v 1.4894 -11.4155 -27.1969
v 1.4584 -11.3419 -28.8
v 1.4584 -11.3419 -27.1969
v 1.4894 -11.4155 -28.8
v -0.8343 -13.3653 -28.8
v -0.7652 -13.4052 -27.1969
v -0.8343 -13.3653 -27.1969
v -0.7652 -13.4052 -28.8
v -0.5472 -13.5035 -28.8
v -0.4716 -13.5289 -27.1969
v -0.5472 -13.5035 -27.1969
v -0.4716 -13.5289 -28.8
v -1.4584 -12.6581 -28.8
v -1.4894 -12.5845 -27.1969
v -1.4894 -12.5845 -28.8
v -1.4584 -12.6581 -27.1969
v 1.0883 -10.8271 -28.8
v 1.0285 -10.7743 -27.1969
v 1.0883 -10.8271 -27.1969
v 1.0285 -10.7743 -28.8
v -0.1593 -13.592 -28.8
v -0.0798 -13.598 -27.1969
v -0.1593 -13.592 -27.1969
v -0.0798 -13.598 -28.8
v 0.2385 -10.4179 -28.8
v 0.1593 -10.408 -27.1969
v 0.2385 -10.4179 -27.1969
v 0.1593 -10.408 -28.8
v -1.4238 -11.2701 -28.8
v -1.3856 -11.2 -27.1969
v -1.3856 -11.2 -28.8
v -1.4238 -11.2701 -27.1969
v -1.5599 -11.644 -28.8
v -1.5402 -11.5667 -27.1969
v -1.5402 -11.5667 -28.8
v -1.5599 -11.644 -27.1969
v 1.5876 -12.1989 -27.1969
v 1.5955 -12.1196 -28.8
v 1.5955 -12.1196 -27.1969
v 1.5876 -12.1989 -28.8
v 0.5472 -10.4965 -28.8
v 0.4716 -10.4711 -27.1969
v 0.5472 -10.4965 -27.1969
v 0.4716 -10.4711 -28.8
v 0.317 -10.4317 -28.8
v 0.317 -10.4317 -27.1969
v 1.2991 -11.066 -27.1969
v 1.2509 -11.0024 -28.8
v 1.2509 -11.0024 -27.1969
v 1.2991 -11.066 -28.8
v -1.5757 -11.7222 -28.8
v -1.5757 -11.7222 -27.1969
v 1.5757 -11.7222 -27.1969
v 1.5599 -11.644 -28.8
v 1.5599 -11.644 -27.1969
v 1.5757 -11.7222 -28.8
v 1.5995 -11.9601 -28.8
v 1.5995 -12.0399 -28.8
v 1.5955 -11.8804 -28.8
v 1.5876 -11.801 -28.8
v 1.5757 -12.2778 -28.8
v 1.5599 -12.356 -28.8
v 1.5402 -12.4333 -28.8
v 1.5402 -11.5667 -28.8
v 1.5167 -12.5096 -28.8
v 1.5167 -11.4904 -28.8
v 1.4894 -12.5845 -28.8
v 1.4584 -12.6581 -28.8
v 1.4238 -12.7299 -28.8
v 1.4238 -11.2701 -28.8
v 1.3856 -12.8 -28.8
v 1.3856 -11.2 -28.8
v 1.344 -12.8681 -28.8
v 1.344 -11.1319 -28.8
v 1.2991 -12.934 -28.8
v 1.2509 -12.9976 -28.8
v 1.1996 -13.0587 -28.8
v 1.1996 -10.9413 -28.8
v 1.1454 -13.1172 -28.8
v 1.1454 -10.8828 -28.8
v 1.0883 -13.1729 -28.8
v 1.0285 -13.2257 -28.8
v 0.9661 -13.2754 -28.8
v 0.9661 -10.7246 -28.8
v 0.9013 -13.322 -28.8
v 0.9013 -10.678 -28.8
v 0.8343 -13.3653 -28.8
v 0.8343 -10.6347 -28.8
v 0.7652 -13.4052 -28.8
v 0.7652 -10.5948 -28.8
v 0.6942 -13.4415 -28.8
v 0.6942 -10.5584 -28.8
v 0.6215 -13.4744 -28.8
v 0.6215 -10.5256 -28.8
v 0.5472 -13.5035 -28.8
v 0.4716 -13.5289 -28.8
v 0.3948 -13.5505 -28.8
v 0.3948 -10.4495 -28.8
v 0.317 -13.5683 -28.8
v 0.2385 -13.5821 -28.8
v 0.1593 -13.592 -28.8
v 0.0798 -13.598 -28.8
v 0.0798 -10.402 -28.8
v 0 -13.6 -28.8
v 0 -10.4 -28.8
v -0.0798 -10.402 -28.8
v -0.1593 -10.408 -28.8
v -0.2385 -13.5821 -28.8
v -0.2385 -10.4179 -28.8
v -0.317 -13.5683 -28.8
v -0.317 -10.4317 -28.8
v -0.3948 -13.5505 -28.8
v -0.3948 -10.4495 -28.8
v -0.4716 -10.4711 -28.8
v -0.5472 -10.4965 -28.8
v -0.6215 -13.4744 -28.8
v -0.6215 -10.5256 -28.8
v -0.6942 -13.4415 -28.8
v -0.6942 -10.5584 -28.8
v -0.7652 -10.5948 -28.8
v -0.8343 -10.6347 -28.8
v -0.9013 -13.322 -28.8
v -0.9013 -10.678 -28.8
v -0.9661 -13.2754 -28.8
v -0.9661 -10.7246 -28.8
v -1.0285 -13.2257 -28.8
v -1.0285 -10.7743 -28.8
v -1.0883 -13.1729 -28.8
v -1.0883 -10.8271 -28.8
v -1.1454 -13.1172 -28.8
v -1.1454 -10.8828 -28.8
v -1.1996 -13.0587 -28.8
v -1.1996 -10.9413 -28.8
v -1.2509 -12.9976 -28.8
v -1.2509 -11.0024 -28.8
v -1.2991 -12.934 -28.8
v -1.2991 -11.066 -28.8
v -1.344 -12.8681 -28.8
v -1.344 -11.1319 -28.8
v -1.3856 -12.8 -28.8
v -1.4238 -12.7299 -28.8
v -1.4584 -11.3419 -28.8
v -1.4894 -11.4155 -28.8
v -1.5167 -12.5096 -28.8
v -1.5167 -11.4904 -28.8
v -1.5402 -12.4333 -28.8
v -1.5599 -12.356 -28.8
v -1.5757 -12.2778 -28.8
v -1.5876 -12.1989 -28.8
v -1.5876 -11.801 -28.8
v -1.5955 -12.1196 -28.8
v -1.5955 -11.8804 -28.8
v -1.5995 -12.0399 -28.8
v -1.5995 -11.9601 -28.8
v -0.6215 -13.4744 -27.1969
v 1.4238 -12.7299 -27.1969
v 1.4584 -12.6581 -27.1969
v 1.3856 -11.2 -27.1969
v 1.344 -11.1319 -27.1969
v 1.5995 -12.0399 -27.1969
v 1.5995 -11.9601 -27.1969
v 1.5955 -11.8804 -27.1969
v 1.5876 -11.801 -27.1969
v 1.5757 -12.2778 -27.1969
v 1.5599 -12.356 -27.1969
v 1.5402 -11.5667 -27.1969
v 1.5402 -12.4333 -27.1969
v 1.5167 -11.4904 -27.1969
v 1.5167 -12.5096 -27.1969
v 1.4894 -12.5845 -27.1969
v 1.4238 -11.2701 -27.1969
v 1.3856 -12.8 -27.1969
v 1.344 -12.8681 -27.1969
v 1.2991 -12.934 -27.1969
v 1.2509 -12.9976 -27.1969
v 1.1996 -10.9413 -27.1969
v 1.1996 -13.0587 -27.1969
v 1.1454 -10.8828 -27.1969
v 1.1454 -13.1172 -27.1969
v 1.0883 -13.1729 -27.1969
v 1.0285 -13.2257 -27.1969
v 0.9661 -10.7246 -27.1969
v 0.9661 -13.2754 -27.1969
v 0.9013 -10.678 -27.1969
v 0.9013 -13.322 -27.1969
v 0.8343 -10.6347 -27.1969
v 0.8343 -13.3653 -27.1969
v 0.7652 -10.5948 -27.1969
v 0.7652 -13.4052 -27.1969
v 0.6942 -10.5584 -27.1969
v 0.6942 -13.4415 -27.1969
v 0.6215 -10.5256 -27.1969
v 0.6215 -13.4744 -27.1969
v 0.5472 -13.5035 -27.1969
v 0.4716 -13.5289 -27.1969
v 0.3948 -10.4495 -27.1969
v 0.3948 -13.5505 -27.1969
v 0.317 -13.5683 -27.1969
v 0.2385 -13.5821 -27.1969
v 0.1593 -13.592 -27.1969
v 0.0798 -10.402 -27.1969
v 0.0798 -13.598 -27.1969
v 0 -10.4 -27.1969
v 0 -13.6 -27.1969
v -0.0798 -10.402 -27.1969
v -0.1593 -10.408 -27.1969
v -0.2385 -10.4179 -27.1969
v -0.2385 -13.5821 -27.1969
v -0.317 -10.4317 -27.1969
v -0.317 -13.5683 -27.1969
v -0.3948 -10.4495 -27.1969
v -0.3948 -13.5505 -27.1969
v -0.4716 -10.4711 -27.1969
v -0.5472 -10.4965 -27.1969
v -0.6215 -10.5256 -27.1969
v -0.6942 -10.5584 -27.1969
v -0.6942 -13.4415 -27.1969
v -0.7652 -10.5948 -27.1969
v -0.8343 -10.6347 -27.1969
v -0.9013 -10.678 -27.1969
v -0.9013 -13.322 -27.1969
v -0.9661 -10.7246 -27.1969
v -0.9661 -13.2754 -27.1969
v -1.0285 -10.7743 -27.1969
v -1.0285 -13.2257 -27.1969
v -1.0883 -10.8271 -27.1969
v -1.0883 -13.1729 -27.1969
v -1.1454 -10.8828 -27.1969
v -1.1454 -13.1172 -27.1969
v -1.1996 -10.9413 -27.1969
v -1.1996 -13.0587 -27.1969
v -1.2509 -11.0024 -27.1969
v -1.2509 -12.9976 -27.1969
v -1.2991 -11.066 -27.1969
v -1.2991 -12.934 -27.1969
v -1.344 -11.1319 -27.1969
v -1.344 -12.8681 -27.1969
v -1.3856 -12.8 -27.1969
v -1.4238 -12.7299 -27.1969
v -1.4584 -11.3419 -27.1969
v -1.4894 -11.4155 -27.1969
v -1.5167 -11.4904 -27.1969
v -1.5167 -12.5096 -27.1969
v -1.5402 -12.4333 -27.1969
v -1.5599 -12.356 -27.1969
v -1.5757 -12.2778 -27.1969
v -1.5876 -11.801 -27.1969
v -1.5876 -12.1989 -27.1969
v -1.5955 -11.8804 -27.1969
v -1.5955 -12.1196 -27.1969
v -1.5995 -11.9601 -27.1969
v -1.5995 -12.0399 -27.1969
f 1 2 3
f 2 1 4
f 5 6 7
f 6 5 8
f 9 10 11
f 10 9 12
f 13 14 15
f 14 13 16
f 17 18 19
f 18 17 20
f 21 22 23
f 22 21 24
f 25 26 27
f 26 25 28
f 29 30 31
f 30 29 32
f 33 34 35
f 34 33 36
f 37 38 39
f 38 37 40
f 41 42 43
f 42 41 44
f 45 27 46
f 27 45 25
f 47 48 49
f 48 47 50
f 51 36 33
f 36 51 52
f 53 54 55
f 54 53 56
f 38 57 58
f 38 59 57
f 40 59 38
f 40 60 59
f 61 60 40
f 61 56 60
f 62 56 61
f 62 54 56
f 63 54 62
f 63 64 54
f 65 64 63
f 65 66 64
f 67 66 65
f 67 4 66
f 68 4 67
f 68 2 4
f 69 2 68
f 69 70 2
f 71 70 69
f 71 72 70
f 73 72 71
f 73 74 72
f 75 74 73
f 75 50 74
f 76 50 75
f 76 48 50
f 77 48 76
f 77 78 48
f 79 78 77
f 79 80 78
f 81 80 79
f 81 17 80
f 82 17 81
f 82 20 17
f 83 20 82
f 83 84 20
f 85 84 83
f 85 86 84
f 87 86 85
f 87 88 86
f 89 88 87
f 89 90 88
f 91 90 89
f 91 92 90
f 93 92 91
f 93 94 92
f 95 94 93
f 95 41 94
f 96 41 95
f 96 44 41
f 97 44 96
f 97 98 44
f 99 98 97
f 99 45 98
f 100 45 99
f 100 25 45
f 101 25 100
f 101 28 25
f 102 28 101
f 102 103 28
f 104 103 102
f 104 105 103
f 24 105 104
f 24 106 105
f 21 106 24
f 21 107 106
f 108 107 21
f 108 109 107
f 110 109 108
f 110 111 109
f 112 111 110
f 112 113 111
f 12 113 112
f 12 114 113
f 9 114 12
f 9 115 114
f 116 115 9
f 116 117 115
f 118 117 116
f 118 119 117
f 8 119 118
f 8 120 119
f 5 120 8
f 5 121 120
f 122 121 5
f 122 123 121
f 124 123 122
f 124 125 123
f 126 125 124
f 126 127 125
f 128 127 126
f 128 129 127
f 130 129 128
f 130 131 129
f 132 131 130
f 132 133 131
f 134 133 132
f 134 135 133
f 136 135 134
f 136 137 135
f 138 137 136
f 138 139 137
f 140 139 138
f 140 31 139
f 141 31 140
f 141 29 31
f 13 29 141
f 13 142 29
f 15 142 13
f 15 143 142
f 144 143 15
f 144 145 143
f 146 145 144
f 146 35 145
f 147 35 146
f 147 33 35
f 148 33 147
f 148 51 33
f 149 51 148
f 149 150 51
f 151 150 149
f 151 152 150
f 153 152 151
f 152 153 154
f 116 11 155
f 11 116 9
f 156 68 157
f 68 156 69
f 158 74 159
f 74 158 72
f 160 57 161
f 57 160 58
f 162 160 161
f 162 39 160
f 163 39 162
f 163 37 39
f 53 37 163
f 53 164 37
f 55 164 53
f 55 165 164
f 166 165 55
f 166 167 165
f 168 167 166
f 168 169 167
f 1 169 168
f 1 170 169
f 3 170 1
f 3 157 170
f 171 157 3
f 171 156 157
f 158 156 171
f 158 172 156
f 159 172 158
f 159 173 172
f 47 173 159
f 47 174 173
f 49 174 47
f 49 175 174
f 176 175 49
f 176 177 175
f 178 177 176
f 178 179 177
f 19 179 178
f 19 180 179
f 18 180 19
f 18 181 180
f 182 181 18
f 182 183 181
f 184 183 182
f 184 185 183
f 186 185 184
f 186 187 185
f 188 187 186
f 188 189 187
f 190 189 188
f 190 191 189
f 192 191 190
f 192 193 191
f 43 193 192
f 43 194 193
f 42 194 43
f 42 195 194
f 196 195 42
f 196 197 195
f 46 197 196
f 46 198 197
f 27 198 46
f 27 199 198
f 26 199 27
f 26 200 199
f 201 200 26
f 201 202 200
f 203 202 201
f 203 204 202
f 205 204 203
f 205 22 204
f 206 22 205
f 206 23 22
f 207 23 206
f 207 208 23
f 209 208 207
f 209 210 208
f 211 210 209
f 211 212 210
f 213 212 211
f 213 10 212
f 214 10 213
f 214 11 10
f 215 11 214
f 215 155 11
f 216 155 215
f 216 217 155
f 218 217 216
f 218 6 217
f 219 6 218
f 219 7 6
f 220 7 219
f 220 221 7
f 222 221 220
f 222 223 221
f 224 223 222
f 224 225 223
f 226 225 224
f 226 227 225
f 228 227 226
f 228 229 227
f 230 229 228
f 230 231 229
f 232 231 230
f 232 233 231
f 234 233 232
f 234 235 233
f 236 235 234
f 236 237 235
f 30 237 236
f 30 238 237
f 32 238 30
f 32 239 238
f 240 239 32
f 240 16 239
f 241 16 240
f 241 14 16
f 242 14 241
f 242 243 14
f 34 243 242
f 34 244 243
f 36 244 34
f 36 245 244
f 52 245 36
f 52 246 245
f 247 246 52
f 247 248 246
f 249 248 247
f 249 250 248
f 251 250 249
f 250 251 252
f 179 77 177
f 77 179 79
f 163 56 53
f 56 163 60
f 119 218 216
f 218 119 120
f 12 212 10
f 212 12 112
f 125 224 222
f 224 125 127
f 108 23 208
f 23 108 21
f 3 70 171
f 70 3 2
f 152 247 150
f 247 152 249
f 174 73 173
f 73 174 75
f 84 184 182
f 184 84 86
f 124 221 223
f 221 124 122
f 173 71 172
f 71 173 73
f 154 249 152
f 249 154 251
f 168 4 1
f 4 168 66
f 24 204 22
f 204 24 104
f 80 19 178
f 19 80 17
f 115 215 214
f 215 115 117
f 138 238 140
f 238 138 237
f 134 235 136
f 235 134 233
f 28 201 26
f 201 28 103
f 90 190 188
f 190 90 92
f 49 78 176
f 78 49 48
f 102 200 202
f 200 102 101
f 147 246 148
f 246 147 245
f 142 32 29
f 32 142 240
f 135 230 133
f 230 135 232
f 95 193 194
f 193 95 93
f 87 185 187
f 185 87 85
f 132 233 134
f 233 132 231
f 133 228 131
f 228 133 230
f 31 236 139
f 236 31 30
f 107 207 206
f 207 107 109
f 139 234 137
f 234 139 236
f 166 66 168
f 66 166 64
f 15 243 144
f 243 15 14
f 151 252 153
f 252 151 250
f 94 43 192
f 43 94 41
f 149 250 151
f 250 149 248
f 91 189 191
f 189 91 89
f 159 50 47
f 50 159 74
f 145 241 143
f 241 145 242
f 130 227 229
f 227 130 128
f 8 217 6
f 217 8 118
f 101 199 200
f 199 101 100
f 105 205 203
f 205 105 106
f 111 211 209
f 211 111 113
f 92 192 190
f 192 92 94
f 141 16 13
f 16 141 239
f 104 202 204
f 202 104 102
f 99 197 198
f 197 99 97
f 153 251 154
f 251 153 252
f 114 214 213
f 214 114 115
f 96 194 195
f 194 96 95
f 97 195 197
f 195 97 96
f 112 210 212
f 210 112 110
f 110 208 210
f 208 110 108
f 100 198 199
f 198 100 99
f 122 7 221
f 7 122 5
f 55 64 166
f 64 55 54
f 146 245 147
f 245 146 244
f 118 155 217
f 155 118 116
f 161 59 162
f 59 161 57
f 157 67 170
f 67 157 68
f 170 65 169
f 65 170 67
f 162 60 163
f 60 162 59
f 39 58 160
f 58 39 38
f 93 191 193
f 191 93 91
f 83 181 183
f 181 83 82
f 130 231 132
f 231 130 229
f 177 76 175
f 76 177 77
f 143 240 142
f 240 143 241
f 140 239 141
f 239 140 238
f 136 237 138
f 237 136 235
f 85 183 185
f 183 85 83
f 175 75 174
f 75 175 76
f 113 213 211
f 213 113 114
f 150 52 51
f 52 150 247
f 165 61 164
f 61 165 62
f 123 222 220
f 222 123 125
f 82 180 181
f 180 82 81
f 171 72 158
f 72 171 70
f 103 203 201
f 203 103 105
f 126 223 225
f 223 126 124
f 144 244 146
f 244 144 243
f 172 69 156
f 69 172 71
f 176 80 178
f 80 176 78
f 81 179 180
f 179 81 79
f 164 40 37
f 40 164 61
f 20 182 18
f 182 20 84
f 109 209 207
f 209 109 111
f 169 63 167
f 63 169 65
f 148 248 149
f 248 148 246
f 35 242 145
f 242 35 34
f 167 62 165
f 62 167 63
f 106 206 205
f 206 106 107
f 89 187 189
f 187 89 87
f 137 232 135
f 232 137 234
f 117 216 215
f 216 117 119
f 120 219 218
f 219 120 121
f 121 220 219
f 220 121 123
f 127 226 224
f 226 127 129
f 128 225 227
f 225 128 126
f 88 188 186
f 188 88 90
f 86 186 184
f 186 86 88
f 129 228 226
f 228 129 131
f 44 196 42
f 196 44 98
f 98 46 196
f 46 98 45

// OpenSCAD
use <../lib.scad>
use <../p/1-4chrd.scad>
use <../p/1-4cyli.scad>
use <../p/1-4edge.scad>
use <../p/2-4cylo.scad>
use <../p/2-4ndis.scad>
use <../p/48/1-4chrd.scad>
use <../p/48/1-4con1.scad>
use <../p/48/1-8chrd.scad>
use <../p/48/2-4edge.scad>
use <../p/48/5-24cyli.scad>
use <../p/48/5-24edge.scad>
use <../p/48/5-48cyli.scad>
use <../p/48/5-48edge.scad>
use <../p/rect.scad>
use <../p/rect2a.scad>
use <../p/rect2p.scad>
use <../p/rect3.scad>
use <../p/stud3.scad>
use <../p/stud6.scad>
$fa=1; $fs=0.2;
function ldraw_lib__38317(realsolid=false) = [
// 0 Cone  4 x  2 x  3 Half
// 0 Name: 38317.dat
// 0 Author: Philippe Hurbain [Philo]
// 0 !LDRAW_ORG Part UPDATE 2019-01
// 0 !LICENSE Licensed under CC BY 2.0 and CC BY 4.0 : see CAreadme.txt
// 
// 0 BFC CERTIFY CCW
  [0,"BFC","CERTIFY"],
  [0,"BFC","CCW"],
// 
// 0 !HISTORY 2019-06-28 [PTadmin] Official Update 2019-01
// 
// 
// 1 16 10 0 -10 0 0 1 0 1 0 -1 0 0 stud6.dat
  [1,16,10,0,-10,0,0,1,0,1,0,-1,0,0, ldraw_lib__stud6(realsolid)],
// 1 16 -10 0 -10 -1 0 0 0 1 0 0 0 -1 stud6.dat
  [1,16,-10,0,-10,-1,0,0,0,1,0,0,0,-1, ldraw_lib__stud6(realsolid)],
// 2 24 -20 72 0 -40 72 0
  [2,24,-20,72,0,-40,72,0],
// 2 24 -20 64 0 -35.5 64 0
  [2,24,-20,64,0,-35.5,64,0],
// 4 16 -20 72 0 -40 72 0 -35.5 64 0 -20 64 0
  [4,16,-20,72,0,-40,72,0,-35.5,64,0,-20,64,0],
// 3 16 -40 68 0 -35.5 64 0 -40 72 0
  [3,16,-40,68,0,-35.5,64,0,-40,72,0],
// 2 24 20 72 0 40 72 0
  [2,24,20,72,0,40,72,0],
// 2 24 20 64 0 35.5 64 0
  [2,24,20,64,0,35.5,64,0],
// 4 16 20 64 0 35.5 64 0 40 72 0 20 72 0
  [4,16,20,64,0,35.5,64,0,40,72,0,20,72,0],
// 3 16 40 72 0 35.5 64 0 40 68 0
  [3,16,40,72,0,35.5,64,0,40,68,0],
// 1 16 0 72 0 -40 0 0 0 1 0 0 0 -40 48\5-48edge.dat
  [1,16,0,72,0,-40,0,0,0,1,0,0,0,-40, ldraw_lib__48__5_48edge(realsolid)],
// 1 16 0 72 0 -24.3504 0 31.7342 0 1 0 -31.7342 0 -24.3504 48\5-24edge.dat
  [1,16,0,72,0,-24.3504,0,31.7342,0,1,0,-31.7342,0,-24.3504, ldraw_lib__48__5_24edge(realsolid)],
// 1 16 0 72 0 40 0 0 0 -1 0 0 0 -40 48\5-48edge.dat
  [1,16,0,72,0,40,0,0,0,-1,0,0,0,-40, ldraw_lib__48__5_48edge(realsolid)],
// 1 16 -10 72 -30 -6 0 0 0 1 0 0 0 -6 1-4edge.dat
  [1,16,-10,72,-30,-6,0,0,0,1,0,0,0,-6, ldraw_lib__1_4edge(realsolid)],
// 1 16 10 72 -30 0 0 6 0 1 0 -6 0 0 1-4edge.dat
  [1,16,10,72,-30,0,0,6,0,1,0,-6,0,0, ldraw_lib__1_4edge(realsolid)],
// 4 16 -34.64 72 -20 -32.042 72 -18.5 -29.3558 72 -22.5256 -31.736 72 -24.352
  [4,16,-34.64,72,-20,-32.042,72,-18.5,-29.3558,72,-22.5256,-31.736,72,-24.352],
// 4 16 -36.956 72 -15.308 -34.1335 72 -14.3155 -32.042 72 -18.5 -34.64 72 -20
  [4,16,-36.956,72,-15.308,-34.1335,72,-14.3155,-32.042,72,-18.5,-34.64,72,-20],
// 3 16 -36.956 72 -15.308 -34.2426 72 -14.2426 -34.1335 72 -14.3155
  [3,16,-36.956,72,-15.308,-34.2426,72,-14.2426,-34.1335,72,-14.3155],
// 4 16 -36.956 72 -15.308 -38.636 72 -10.352 -35.5434 72 -12.2962 -34.2426 72 -14.2426
  [4,16,-36.956,72,-15.308,-38.636,72,-10.352,-35.5434,72,-12.2962,-34.2426,72,-14.2426],
// 3 16 -36 72 -10 -35.5434 72 -12.2962 -38.636 72 -10.352
  [3,16,-36,72,-10,-35.5434,72,-12.2962,-38.636,72,-10.352],
// 4 16 -35.8269 72 -9.1297 -36 72 -10 -38.636 72 -10.352 -39.656 72 -5.22
  [4,16,-35.8269,72,-9.1297,-36,72,-10,-38.636,72,-10.352,-39.656,72,-5.22],
// 4 16 -39.656 72 -5.22 -40 72 0 -36.7364 72 -4 -35.8269 72 -9.1297
  [4,16,-39.656,72,-5.22,-40,72,0,-36.7364,72,-4,-35.8269,72,-9.1297],
// 4 16 -24 72 -4 -36.7364 72 -4 -40 72 0 -20 72 0
  [4,16,-24,72,-4,-36.7364,72,-4,-40,72,0,-20,72,0],
// 1 16 -22 72 -12 0 0 -2 0 -1 0 -10 0 -2 rect2p.dat
  [1,16,-22,72,-12,0,0,-2,0,-1,0,-10,0,-2, ldraw_lib__rect2p(realsolid)],
// 3 16 -24 72 -24 -20 72 -20 -19 72 -24
  [3,16,-24,72,-24,-20,72,-20,-19,72,-24],
// 3 16 -19 72 -24 -20 72 -20 -16 72 -24
  [3,16,-19,72,-24,-20,72,-20,-16,72,-24],
// 4 16 -16 72 -24 -16 72 -30 -19 72 -29.3558 -19 72 -24
  [4,16,-16,72,-24,-16,72,-30,-19,72,-29.3558,-19,72,-24],
// 4 16 -22.5256 72 -29.3558 -19 72 -29.3558 -16 72 -30 -24.352 72 -31.736
  [4,16,-22.5256,72,-29.3558,-19,72,-29.3558,-16,72,-30,-24.352,72,-31.736],
// 4 16 -24.352 72 -31.736 -16 72 -30 -15.5434 72 -32.2962 -20 72 -34.64
  [4,16,-24.352,72,-31.736,-16,72,-30,-15.5434,72,-32.2962,-20,72,-34.64],
// 4 16 -20 72 -34.64 -15.5434 72 -32.2962 -14.2426 72 -34.2426 -15.308 72 -36.956
  [4,16,-20,72,-34.64,-15.5434,72,-32.2962,-14.2426,72,-34.2426,-15.308,72,-36.956],
// 3 16 -15.308 72 -36.956 -14.2426 72 -34.2426 -12.2962 72 -35.5434
  [3,16,-15.308,72,-36.956,-14.2426,72,-34.2426,-12.2962,72,-35.5434],
// 4 16 -10.352 72 -38.636 -15.308 72 -36.956 -12.2962 72 -35.5434 -10 72 -36
  [4,16,-10.352,72,-38.636,-15.308,72,-36.956,-12.2962,72,-35.5434,-10,72,-36],
// 4 16 -10 72 -36 0 72 -36 -5.22 72 -39.656 -10.352 72 -38.636
  [4,16,-10,72,-36,0,72,-36,-5.22,72,-39.656,-10.352,72,-38.636],
// 4 16 -5.22 72 -39.656 0 72 -36 5.22 72 -39.656 0 72 -40
  [4,16,-5.22,72,-39.656,0,72,-36,5.22,72,-39.656,0,72,-40],
// 4 16 20 72 -20 16 72 -24 -16 72 -24 -20 72 -20
  [4,16,20,72,-20,16,72,-24,-16,72,-24,-20,72,-20],
// 4 16 10.352 72 -38.636 5.22 72 -39.656 0 72 -36 10 72 -36
  [4,16,10.352,72,-38.636,5.22,72,-39.656,0,72,-36,10,72,-36],
// 4 16 10 72 -36 12.2962 72 -35.5434 15.308 72 -36.956 10.352 72 -38.636
  [4,16,10,72,-36,12.2962,72,-35.5434,15.308,72,-36.956,10.352,72,-38.636],
// 3 16 12.2962 72 -35.5434 14.2426 72 -34.2426 15.308 72 -36.956
  [3,16,12.2962,72,-35.5434,14.2426,72,-34.2426,15.308,72,-36.956],
// 4 16 15.308 72 -36.956 14.2426 72 -34.2426 15.5434 72 -32.2962 20 72 -34.64
  [4,16,15.308,72,-36.956,14.2426,72,-34.2426,15.5434,72,-32.2962,20,72,-34.64],
// 4 16 20 72 -34.64 15.5434 72 -32.2962 16 72 -30 24.352 72 -31.736
  [4,16,20,72,-34.64,15.5434,72,-32.2962,16,72,-30,24.352,72,-31.736],
// 4 16 24.352 72 -31.736 16 72 -30 19 72 -29.3558 22.5256 72 -29.3558
  [4,16,24.352,72,-31.736,16,72,-30,19,72,-29.3558,22.5256,72,-29.3558],
// 4 16 19 72 -24 19 72 -29.3558 16 72 -30 16 72 -24
  [4,16,19,72,-24,19,72,-29.3558,16,72,-30,16,72,-24],
// 3 16 16 72 -24 20 72 -20 19 72 -24
  [3,16,16,72,-24,20,72,-20,19,72,-24],
// 3 16 19 72 -24 20 72 -20 24 72 -24
  [3,16,19,72,-24,20,72,-20,24,72,-24],
// 1 16 22 72 -12 0 0 -2 0 -1 0 -10 0 2 rect2p.dat
  [1,16,22,72,-12,0,0,-2,0,-1,0,-10,0,2, ldraw_lib__rect2p(realsolid)],
// 4 16 20 72 0 40 72 0 36.7364 72 -4 24 72 -4
  [4,16,20,72,0,40,72,0,36.7364,72,-4,24,72,-4],
// 4 16 35.8269 72 -9.1297 36.7364 72 -4 40 72 0 39.656 72 -5.22
  [4,16,35.8269,72,-9.1297,36.7364,72,-4,40,72,0,39.656,72,-5.22],
// 4 16 39.656 72 -5.22 38.636 72 -10.352 36 72 -10 35.8269 72 -9.1297
  [4,16,39.656,72,-5.22,38.636,72,-10.352,36,72,-10,35.8269,72,-9.1297],
// 3 16 38.636 72 -10.352 35.5434 72 -12.2962 36 72 -10
  [3,16,38.636,72,-10.352,35.5434,72,-12.2962,36,72,-10],
// 4 16 34.2426 72 -14.2426 35.5434 72 -12.2962 38.636 72 -10.352 36.956 72 -15.308
  [4,16,34.2426,72,-14.2426,35.5434,72,-12.2962,38.636,72,-10.352,36.956,72,-15.308],
// 3 16 34.1335 72 -14.3155 34.2426 72 -14.2426 36.956 72 -15.308
  [3,16,34.1335,72,-14.3155,34.2426,72,-14.2426,36.956,72,-15.308],
// 4 16 34.64 72 -20 32.042 72 -18.5 34.1335 72 -14.3155 36.956 72 -15.308
  [4,16,34.64,72,-20,32.042,72,-18.5,34.1335,72,-14.3155,36.956,72,-15.308],
// 4 16 31.736 72 -24.352 29.3558 72 -22.5256 32.042 72 -18.5 34.64 72 -20
  [4,16,31.736,72,-24.352,29.3558,72,-22.5256,32.042,72,-18.5,34.64,72,-20],
// 1 16 0 68 0 -40 0 0 0 4 0 0 0 -40 48\5-48cyli.dat
  [1,16,0,68,0,-40,0,0,0,4,0,0,0,-40, ldraw_lib__48__5_48cyli(realsolid)],
// 1 16 -30.5459 70 -23.4388 0 -0.52001 -1.1901 -2 0 0 0 0.85416 -0.9132 rect.dat
  [1,16,-30.5459,70,-23.4388,0,-0.52001,-1.1901,-2,0,0,0,0.85416,-0.9132, ldraw_lib__rect(realsolid)],
// 1 16 -30.6989 70 -20.5128 1.3431 -0.83182 0 0 0 2 -2.0128 -0.55505 0 rect2p.dat
  [1,16,-30.6989,70,-20.5128,1.3431,-0.83182,0,0,0,2,-2.0128,-0.55505,0, ldraw_lib__rect2p(realsolid)],
// 1 16 -33.0878 70 -16.4078 1.0458 -0.89448 0 0 0 2 -2.0922 -0.44711 0 rect2p.dat
  [1,16,-33.0878,70,-16.4078,1.0458,-0.89448,0,0,0,2,-2.0922,-0.44711,0, ldraw_lib__rect2p(realsolid)],
// 2 24 -34.1335 68 -14.3155 -34.2426 68 -14.2426
  [2,24,-34.1335,68,-14.3155,-34.2426,68,-14.2426],
// 2 24 -34.1335 72 -14.3155 -34.2426 72 -14.2426
  [2,24,-34.1335,72,-14.3155,-34.2426,72,-14.2426],
// 4 16 -34.2426 72 -14.2426 -34.2426 68 -14.2426 -34.1335 68 -14.3155 -34.1335 72 -14.3155
  [4,16,-34.2426,72,-14.2426,-34.2426,68,-14.2426,-34.1335,68,-14.3155,-34.1335,72,-14.3155],
// 1 16 -34.893 70 -13.2694 0.6504 -0.83142 0 0 0 2 -0.9732 -0.55565 0 rect2p.dat
  [1,16,-34.893,70,-13.2694,0.6504,-0.83142,0,0,0,2,-0.9732,-0.55565,0, ldraw_lib__rect2p(realsolid)],
// 1 16 -35.7717 70 -11.1481 0.2283 -0.9808 0 0 0 2 -1.1481 -0.19503 0 rect2p.dat
  [1,16,-35.7717,70,-11.1481,0.2283,-0.9808,0,0,0,2,-1.1481,-0.19503,0, ldraw_lib__rect2p(realsolid)],
// 1 16 -35.9134 70 -9.5648 -0.0866 -0.70026 0 0 0 2 -0.4352 0.71389 0 rect2p.dat
  [1,16,-35.9134,70,-9.5648,-0.0866,-0.70026,0,0,0,2,-0.4352,0.71389,0, ldraw_lib__rect2p(realsolid)],
// 1 16 -36.2816 70 -6.5648 0 -0.98464 -0.4548 2 0 0 0 -0.17458 2.5648 rect3.dat
  [1,16,-36.2816,70,-6.5648,0,-0.98464,-0.4548,2,0,0,0,-0.17458,2.5648, ldraw_lib__rect3(realsolid)],
// 5 24 -32.042 72 -18.5 -32.042 68 -18.5 -29.3558 68 -22.5256 -34.1335 72 -14.3155
  [5,24,-32.042,72,-18.5,-32.042,68,-18.5,-29.3558,68,-22.5256,-34.1335,72,-14.3155],
// 5 24 -34.1335 72 -14.3155 -34.1335 68 -14.3155 -32.042 68 -18.5 -34.2426 72 -14.2426
  [5,24,-34.1335,72,-14.3155,-34.1335,68,-14.3155,-32.042,68,-18.5,-34.2426,72,-14.2426],
// 5 24 -34.2426 72 -14.2426 -34.2426 68 -14.2426 -34.1335 68 -14.3155 -36 72 -10
  [5,24,-34.2426,72,-14.2426,-34.2426,68,-14.2426,-34.1335,68,-14.3155,-36,72,-10],
// 5 24 -35.5434 72 -12.2962 -35.5434 68 -12.2962 -34.2426 68 -14.2426 -36 72 -10
  [5,24,-35.5434,72,-12.2962,-35.5434,68,-12.2962,-34.2426,68,-14.2426,-36,72,-10],
// 5 24 -36 72 -10 -36 68 -10 -34.2426 68 -14.2426 -35.8269 72 -9.1297
  [5,24,-36,72,-10,-36,68,-10,-34.2426,68,-14.2426,-35.8269,72,-9.1297],
// 5 24 -35.8269 72 -9.1297 -35.8269 68 -9.1297 -36 68 -10 -36.7364 72 -4
  [5,24,-35.8269,72,-9.1297,-35.8269,68,-9.1297,-36,68,-10,-36.7364,72,-4],
// 1 16 -30.3682 70 -4 0 0 6.3682 2 0 0 0 1 0 rect3.dat
  [1,16,-30.3682,70,-4,0,0,6.3682,2,0,0,0,1,0, ldraw_lib__rect3(realsolid)],
// 1 16 -24 70 -14 0 1 0 0 0 -2 -10 0 0 rect2a.dat
  [1,16,-24,70,-14,0,1,0,0,0,-2,-10,0,0, ldraw_lib__rect2a(realsolid)],
// 1 16 -21.5 70 -24 0 0 2.5 2 0 0 0 1 0 rect3.dat
  [1,16,-21.5,70,-24,0,0,2.5,2,0,0,0,1,0, ldraw_lib__rect3(realsolid)],
// 1 16 -19 70 -26.6779 0 1 0 2 0 0 0 0 -2.6779 rect3.dat
  [1,16,-19,70,-26.6779,0,1,0,2,0,0,0,0,-2.6779, ldraw_lib__rect3(realsolid)],
// 1 16 -20.7628 70 -29.3558 0 0 -1.7628 2 0 0 0 -1 0 rect3.dat
  [1,16,-20.7628,70,-29.3558,0,0,-1.7628,2,0,0,0,-1,0, ldraw_lib__rect3(realsolid)],
// 1 16 -23.4388 70 -30.5459 0 0.62154 -0.9132 2 0 0 0 -0.78339 -1.1901 rect3.dat
  [1,16,-23.4388,70,-30.5459,0,0.62154,-0.9132,2,0,0,0,-0.78339,-1.1901, ldraw_lib__rect3(realsolid)],
// 1 16 0 72 0 40 0 0 0 -4 0 0 0 -40 48\5-48cyli.dat
  [1,16,0,72,0,40,0,0,0,-4,0,0,0,-40, ldraw_lib__48__5_48cyli(realsolid)],
// 1 16 30.5459 70 -23.4388 0 0.52001 1.1901 2 0 0 0 0.85416 -0.9132 rect.dat
  [1,16,30.5459,70,-23.4388,0,0.52001,1.1901,2,0,0,0,0.85416,-0.9132, ldraw_lib__rect(realsolid)],
// 1 16 30.6989 70 -20.5128 -1.3431 0.63949 0 0 0 -2 -2.0128 -0.7688 0 rect2p.dat
  [1,16,30.6989,70,-20.5128,-1.3431,0.63949,0,0,0,-2,-2.0128,-0.7688,0, ldraw_lib__rect2p(realsolid)],
// 1 16 33.0878 70 -16.4078 -1.0458 0.6667 0 0 0 -2 -2.0922 -0.74533 0 rect2p.dat
  [1,16,33.0878,70,-16.4078,-1.0458,0.6667,0,0,0,-2,-2.0922,-0.74533,0, ldraw_lib__rect2p(realsolid)],
// 2 24 34.1335 68 -14.3155 34.2426 68 -14.2426
  [2,24,34.1335,68,-14.3155,34.2426,68,-14.2426],
// 2 24 34.1335 72 -14.3155 34.2426 72 -14.2426
  [2,24,34.1335,72,-14.3155,34.2426,72,-14.2426],
// 4 16 34.2426 68 -14.2426 34.2426 72 -14.2426 34.1335 72 -14.3155 34.1335 68 -14.3155
  [4,16,34.2426,68,-14.2426,34.2426,72,-14.2426,34.1335,72,-14.3155,34.1335,68,-14.3155],
// 1 16 34.893 70 -13.2694 0.6504 0.63931 0 0 0 2 0.9732 -0.76895 0 rect2p.dat
  [1,16,34.893,70,-13.2694,0.6504,0.63931,0,0,0,2,0.9732,-0.76895,0, ldraw_lib__rect2p(realsolid)],
// 1 16 35.7717 70 -11.1481 0.2283 0.70022 0 0 0 2 1.1481 -0.71393 0 rect2p.dat
  [1,16,35.7717,70,-11.1481,0.2283,0.70022,0,0,0,2,1.1481,-0.71393,0, ldraw_lib__rect2p(realsolid)],
// 1 16 35.9134 70 -9.5648 0.0866 0.70026 0 0 0 -2 -0.4352 0.71389 0 rect2p.dat
  [1,16,35.9134,70,-9.5648,0.0866,0.70026,0,0,0,-2,-0.4352,0.71389,0, ldraw_lib__rect2p(realsolid)],
// 1 16 36.2816 70 -6.5648 0 0.7016 0.4548 -2 0 0 0 -0.71257 2.5648 rect3.dat
  [1,16,36.2816,70,-6.5648,0,0.7016,0.4548,-2,0,0,0,-0.71257,2.5648, ldraw_lib__rect3(realsolid)],
// 5 24 32.042 68 -18.5 32.042 72 -18.5 29.3558 72 -22.5256 34.1335 68 -14.3155
  [5,24,32.042,68,-18.5,32.042,72,-18.5,29.3558,72,-22.5256,34.1335,68,-14.3155],
// 5 24 34.1335 68 -14.3155 34.1335 72 -14.3155 32.042 72 -18.5 34.2426 68 -14.2426
  [5,24,34.1335,68,-14.3155,34.1335,72,-14.3155,32.042,72,-18.5,34.2426,68,-14.2426],
// 5 24 34.2426 68 -14.2426 34.2426 72 -14.2426 34.1335 72 -14.3155 36 68 -10
  [5,24,34.2426,68,-14.2426,34.2426,72,-14.2426,34.1335,72,-14.3155,36,68,-10],
// 5 24 35.5434 72 -12.2962 35.5434 68 -12.2962 34.2426 68 -14.2426 36 72 -10
  [5,24,35.5434,72,-12.2962,35.5434,68,-12.2962,34.2426,68,-14.2426,36,72,-10],
// 5 24 36 68 -10 36 72 -10 34.2426 72 -14.2426 35.8269 68 -9.1297
  [5,24,36,68,-10,36,72,-10,34.2426,72,-14.2426,35.8269,68,-9.1297],
// 5 24 35.8269 68 -9.1297 35.8269 72 -9.1297 36 72 -10 36.7364 68 -4
  [5,24,35.8269,68,-9.1297,35.8269,72,-9.1297,36,72,-10,36.7364,68,-4],
// 1 16 30.3682 70 -4 0 0 -6.3682 -2 0 0 0 1 0 rect3.dat
  [1,16,30.3682,70,-4,0,0,-6.3682,-2,0,0,0,1,0, ldraw_lib__rect3(realsolid)],
// 1 16 24 70 -14 0 -1 0 -2 0 0 0 0 -10 rect2a.dat
  [1,16,24,70,-14,0,-1,0,-2,0,0,0,0,-10, ldraw_lib__rect2a(realsolid)],
// 1 16 21.5 70 -24 0 0 -2.5 -2 0 0 0 1 0 rect3.dat
  [1,16,21.5,70,-24,0,0,-2.5,-2,0,0,0,1,0, ldraw_lib__rect3(realsolid)],
// 1 16 19 70 -26.6779 0 -1 0 -2 0 0 0 0 -2.6779 rect3.dat
  [1,16,19,70,-26.6779,0,-1,0,-2,0,0,0,0,-2.6779, ldraw_lib__rect3(realsolid)],
// 1 16 20.7628 70 -29.3558 0 0 1.7628 -2 0 0 0 -1 0 rect3.dat
  [1,16,20.7628,70,-29.3558,0,0,1.7628,-2,0,0,0,-1,0, ldraw_lib__rect3(realsolid)],
// 1 16 23.4388 70 -30.5459 0 -0.79335 0.9132 -2 0 0 0 -0.60876 -1.1901 rect3.dat
  [1,16,23.4388,70,-30.5459,0,-0.79335,0.9132,-2,0,0,0,-0.60876,-1.1901, ldraw_lib__rect3(realsolid)],
// 1 16 0 68 -30 -1 0 0 0 -1 0 0 0 1 stud3.dat
  [1,16,0,68,-30,-1,0,0,0,-1,0,0,0,1, ldraw_lib__stud3(realsolid)],
// 1 16 0 70 -24 -16 0 0 0 0 2 0 1 0 rect.dat
  [1,16,0,70,-24,-16,0,0,0,0,2,0,1,0, ldraw_lib__rect(realsolid)],
// 1 16 -16 70 -27 0 -1 0 0 0 2 -3 0 0 rect2p.dat
  [1,16,-16,70,-27,0,-1,0,0,0,2,-3,0,0, ldraw_lib__rect2p(realsolid)],
// 1 16 -10 68 -30 -6 0 0 0 1 0 0 0 -6 1-4edge.dat
  [1,16,-10,68,-30,-6,0,0,0,1,0,0,0,-6, ldraw_lib__1_4edge(realsolid)],
// 0 BFC INVERTNEXT
  [0,"BFC","INVERTNEXT"],
// 1 16 -10 68 -30 -6 0 0 0 4 0 0 0 -6 1-4cyli.dat
  [1,16,-10,68,-30,-6,0,0,0,4,0,0,0,-6, ldraw_lib__1_4cyli(realsolid)],
// 1 16 0 70 -36 10 0 0 0 0 2 0 -1 0 rect2p.dat
  [1,16,0,70,-36,10,0,0,0,0,2,0,-1,0, ldraw_lib__rect2p(realsolid)],
// 1 16 10 68 -30 0 0 6 0 1 0 -6 0 0 1-4edge.dat
  [1,16,10,68,-30,0,0,6,0,1,0,-6,0,0, ldraw_lib__1_4edge(realsolid)],
// 0 BFC INVERTNEXT
  [0,"BFC","INVERTNEXT"],
// 1 16 10 68 -30 0 0 6 0 4 0 -6 0 0 1-4cyli.dat
  [1,16,10,68,-30,0,0,6,0,4,0,-6,0,0, ldraw_lib__1_4cyli(realsolid)],
// 1 16 16 70 -27 0 1 0 0 0 2 3 0 0 rect2p.dat
  [1,16,16,70,-27,0,1,0,0,0,2,3,0,0, ldraw_lib__rect2p(realsolid)],
// 1 16 10 68 -30 6 0 0 0 -1 0 0 0 -6 1-4chrd.dat
  [1,16,10,68,-30,6,0,0,0,-1,0,0,0,-6, ldraw_lib__1_4chrd(realsolid)],
// 1 16 -10 68 -30 0 0 -6 0 -1 0 -6 0 0 1-4chrd.dat
  [1,16,-10,68,-30,0,0,-6,0,-1,0,-6,0,0, ldraw_lib__1_4chrd(realsolid)],
// 4 16 16 68 -24 16 68 -30 -16 68 -30 -16 68 -24
  [4,16,16,68,-24,16,68,-30,-16,68,-30,-16,68,-24],
// 4 16 -10 68 -36 -16 68 -30 16 68 -30 10 68 -36
  [4,16,-10,68,-36,-16,68,-30,16,68,-30,10,68,-36],
// 4 16 -35.8269 68 -9.1297 -36.7364 68 -4 -24 68 -4 -34.1335 68 -14.3155
  [4,16,-35.8269,68,-9.1297,-36.7364,68,-4,-24,68,-4,-34.1335,68,-14.3155],
// 4 16 -34.1335 68 -14.3155 -34.2426 68 -14.2426 -36 68 -10 -35.8269 68 -9.1297
  [4,16,-34.1335,68,-14.3155,-34.2426,68,-14.2426,-36,68,-10,-35.8269,68,-9.1297],
// 3 16 -36 68 -10 -34.2426 68 -14.2426 -35.5434 68 -12.2962
  [3,16,-36,68,-10,-34.2426,68,-14.2426,-35.5434,68,-12.2962],
// 3 16 -32.042 68 -18.5 -34.1335 68 -14.3155 -24 68 -4
  [3,16,-32.042,68,-18.5,-34.1335,68,-14.3155,-24,68,-4],
// 4 16 -24 68 -24 -29.3558 68 -22.5256 -32.042 68 -18.5 -24 68 -4
  [4,16,-24,68,-24,-29.3558,68,-22.5256,-32.042,68,-18.5,-24,68,-4],
// 4 16 -28.284 68 -28.284 -31.736 68 -24.352 -29.3558 68 -22.5256 -24 68 -24
  [4,16,-28.284,68,-28.284,-31.736,68,-24.352,-29.3558,68,-22.5256,-24,68,-24],
// 4 16 -24 68 -24 -22.5256 68 -29.3558 -24.352 68 -31.736 -28.284 68 -28.284
  [4,16,-24,68,-24,-22.5256,68,-29.3558,-24.352,68,-31.736,-28.284,68,-28.284],
// 4 16 -19 68 -24 -19 68 -29.3558 -22.5256 68 -29.3558 -24 68 -24
  [4,16,-19,68,-24,-19,68,-29.3558,-22.5256,68,-29.3558,-24,68,-24],
// 4 16 24 68 -4 36.7364 68 -4 35.8269 68 -9.1297 34.1335 68 -14.3155
  [4,16,24,68,-4,36.7364,68,-4,35.8269,68,-9.1297,34.1335,68,-14.3155],
// 4 16 35.8269 68 -9.1297 36 68 -10 34.2426 68 -14.2426 34.1335 68 -14.3155
  [4,16,35.8269,68,-9.1297,36,68,-10,34.2426,68,-14.2426,34.1335,68,-14.3155],
// 3 16 35.5434 68 -12.2962 34.2426 68 -14.2426 36 68 -10
  [3,16,35.5434,68,-12.2962,34.2426,68,-14.2426,36,68,-10],
// 3 16 24 68 -4 34.1335 68 -14.3155 32.042 68 -18.5
  [3,16,24,68,-4,34.1335,68,-14.3155,32.042,68,-18.5],
// 4 16 24 68 -4 32.042 68 -18.5 29.3558 68 -22.5256 24 68 -24
  [4,16,24,68,-4,32.042,68,-18.5,29.3558,68,-22.5256,24,68,-24],
// 4 16 24 68 -24 29.3558 68 -22.5256 31.736 68 -24.352 28.284 68 -28.284
  [4,16,24,68,-24,29.3558,68,-22.5256,31.736,68,-24.352,28.284,68,-28.284],
// 4 16 28.284 68 -28.284 24.352 68 -31.736 22.5256 68 -29.3558 24 68 -24
  [4,16,28.284,68,-28.284,24.352,68,-31.736,22.5256,68,-29.3558,24,68,-24],
// 4 16 24 68 -24 22.5256 68 -29.3558 19 68 -29.3558 19 68 -24
  [4,16,24,68,-24,22.5256,68,-29.3558,19,68,-29.3558,19,68,-24],
// 1 16 0 68 0 -24.3504 0 31.7342 0 4 0 -31.7342 0 -24.3504 48\5-24cyli.dat
  [1,16,0,68,0,-24.3504,0,31.7342,0,4,0,-31.7342,0,-24.3504, ldraw_lib__48__5_24cyli(realsolid)],
// 1 16 -20 68 -10 0 -1 0 0 0 -4 10 0 0 rect3.dat
  [1,16,-20,68,-10,0,-1,0,0,0,-4,10,0,0, ldraw_lib__rect3(realsolid)],
// 1 16 0 68 -20 0 0 20 -4 0 0 0 -1 0 rect3.dat
  [1,16,0,68,-20,0,0,20,-4,0,0,0,-1,0, ldraw_lib__rect3(realsolid)],
// 1 16 20 68 -10 0 1 0 -4 0 0 0 0 10 rect2a.dat
  [1,16,20,68,-10,0,1,0,-4,0,0,0,0,10, ldraw_lib__rect2a(realsolid)],
// 1 16 0 64 0 -35.5 0 0 0 1 0 0 0 -35.5 48\1-8chrd.dat
  [1,16,0,64,0,-35.5,0,0,0,1,0,0,0,-35.5, ldraw_lib__48__1_8chrd(realsolid)],
// 1 16 0 64 0 0 0 35.5 0 1 0 -35.5 0 0 48\1-8chrd.dat
  [1,16,0,64,0,0,0,35.5,0,1,0,-35.5,0,0, ldraw_lib__48__1_8chrd(realsolid)],
// 1 16 0 64 0 35.5 0 0 0 1 0 0 0 -35.5 48\1-8chrd.dat
  [1,16,0,64,0,35.5,0,0,0,1,0,0,0,-35.5, ldraw_lib__48__1_8chrd(realsolid)],
// 1 16 0 64 0 0 0 -35.5 0 1 0 -35.5 0 0 48\1-8chrd.dat
  [1,16,0,64,0,0,0,-35.5,0,1,0,-35.5,0,0, ldraw_lib__48__1_8chrd(realsolid)],
// 1 16 0 64 0 35.5 0 0 0 1 0 0 0 -35.5 48\2-4edge.dat
  [1,16,0,64,0,35.5,0,0,0,1,0,0,0,-35.5, ldraw_lib__48__2_4edge(realsolid)],
// 1 16 0 4 0 17.75 0 0 0 1 0 0 0 -17.75 48\2-4edge.dat
  [1,16,0,4,0,17.75,0,0,0,1,0,0,0,-17.75, ldraw_lib__48__2_4edge(realsolid)],
// 1 16 0 68 0 40 0 0 0 1 0 0 0 -40 48\2-4edge.dat
  [1,16,0,68,0,40,0,0,0,1,0,0,0,-40, ldraw_lib__48__2_4edge(realsolid)],
// 4 16 -20 64 -20 -20 64 0 -35.5 64 0 -25.1021 64 -25.1021
  [4,16,-20,64,-20,-20,64,0,-35.5,64,0,-25.1021,64,-25.1021],
// 4 16 25.1021 64 -25.1021 20 64 -20 -20 64 -20 -25.1021 64 -25.1021
  [4,16,25.1021,64,-25.1021,20,64,-20,-20,64,-20,-25.1021,64,-25.1021],
// 3 16 25.1021 64 -25.1021 -25.1021 64 -25.1021 0 64 -35.5
  [3,16,25.1021,64,-25.1021,-25.1021,64,-25.1021,0,64,-35.5],
// 4 16 25.1021 64 -25.1021 35.5 64 0 20 64 0 20 64 -20
  [4,16,25.1021,64,-25.1021,35.5,64,0,20,64,0,20,64,-20],
// 0 BFC INVERTNEXT
  [0,"BFC","INVERTNEXT"],
// 1 16 0 64 0 17.75 0 0 0 -60 0 0 0 -17.75 48\1-4con1.dat
  [1,16,0,64,0,17.75,0,0,0,-60,0,0,0,-17.75, ldraw_lib__48__1_4con1(realsolid)],
// 1 16 0 68 0 20 0 0 0 -68 0 0 0 -20 48\1-4con1.dat
  [1,16,0,68,0,20,0,0,0,-68,0,0,0,-20, ldraw_lib__48__1_4con1(realsolid)],
// 1 16 0 4 0 17.75 0 0 0 -1 0 0 0 -17.75 48\1-4chrd.dat
  [1,16,0,4,0,17.75,0,0,0,-1,0,0,0,-17.75, ldraw_lib__48__1_4chrd(realsolid)],
// 1 16 0 0 0 20 0 0 0 1 0 0 0 -20 48\1-4chrd.dat
  [1,16,0,0,0,20,0,0,0,1,0,0,0,-20, ldraw_lib__48__1_4chrd(realsolid)],
// 2 24 20 0 0 40 68 0
  [2,24,20,0,0,40,68,0],
// 2 24 17.75 4 0 35.5 64 0
  [2,24,17.75,4,0,35.5,64,0],
// 2 24 40 68 0 40 72 0
  [2,24,40,68,0,40,72,0],
// 0 BFC INVERTNEXT
  [0,"BFC","INVERTNEXT"],
// 1 16 0 64 0 -17.75 0 0 0 -60 0 0 0 -17.75 48\1-4con1.dat
  [1,16,0,64,0,-17.75,0,0,0,-60,0,0,0,-17.75, ldraw_lib__48__1_4con1(realsolid)],
// 1 16 0 68 0 -20 0 0 0 -68 0 0 0 -20 48\1-4con1.dat
  [1,16,0,68,0,-20,0,0,0,-68,0,0,0,-20, ldraw_lib__48__1_4con1(realsolid)],
// 1 16 0 4 0 -17.75 0 0 0 -1 0 0 0 -17.75 48\1-4chrd.dat
  [1,16,0,4,0,-17.75,0,0,0,-1,0,0,0,-17.75, ldraw_lib__48__1_4chrd(realsolid)],
// 1 16 0 0 0 -20 0 0 0 1 0 0 0 -20 48\1-4chrd.dat
  [1,16,0,0,0,-20,0,0,0,1,0,0,0,-20, ldraw_lib__48__1_4chrd(realsolid)],
// 2 24 -20 0 0 -40 68 0
  [2,24,-20,0,0,-40,68,0],
// 2 24 -17.75 4 0 -35.5 64 0
  [2,24,-17.75,4,0,-35.5,64,0],
// 2 24 -40 68 0 -40 72 0
  [2,24,-40,68,0,-40,72,0],
// 4 16 35.5 64 0 17.75 4 0 20 0 0 40 68 0
  [4,16,35.5,64,0,17.75,4,0,20,0,0,40,68,0],
// 4 16 -20 0 0 -17.75 4 0 -35.5 64 0 -40 68 0
  [4,16,-20,0,0,-17.75,4,0,-35.5,64,0,-40,68,0],
// 1 16 0 0 0 -20 0 0 0 1 0 0 0 -20 48\2-4edge.dat
  [1,16,0,0,0,-20,0,0,0,1,0,0,0,-20, ldraw_lib__48__2_4edge(realsolid)],
// 0 BFC INVERTNEXT
  [0,"BFC","INVERTNEXT"],
// 1 16 0 0 0 4 0 0 0 4 0 0 0 -4 2-4cylo.dat
  [1,16,0,0,0,4,0,0,0,4,0,0,0,-4, ldraw_lib__2_4cylo(realsolid)],
// 1 16 0 0 0 4 0 0 0 4 0 0 0 -4 2-4ndis.dat
  [1,16,0,0,0,4,0,0,0,4,0,0,0,-4, ldraw_lib__2_4ndis(realsolid)],
// 1 16 0 4 0 4 0 0 0 -4 0 0 0 -4 2-4ndis.dat
  [1,16,0,4,0,4,0,0,0,-4,0,0,0,-4, ldraw_lib__2_4ndis(realsolid)],
// 3 16 4 4 -4 0 4 -17.75 -4 4 -4
  [3,16,4,4,-4,0,4,-17.75,-4,4,-4],
// 3 16 0 4 -17.75 4 4 -4 17.75 4 0
  [3,16,0,4,-17.75,4,4,-4,17.75,4,0],
// 3 16 17.75 4 0 4 4 -4 4 4 0
  [3,16,17.75,4,0,4,4,-4,4,4,0],
// 3 16 -4 4 -4 0 4 -17.75 -17.75 4 0
  [3,16,-4,4,-4,0,4,-17.75,-17.75,4,0],
// 3 16 -4 4 -4 -17.75 4 0 -4 4 0
  [3,16,-4,4,-4,-17.75,4,0,-4,4,0],
// 3 16 -4 0 -4 -4 0 0 -20 0 0
  [3,16,-4,0,-4,-4,0,0,-20,0,0],
// 3 16 -4 0 -4 -20 0 0 0 0 -20
  [3,16,-4,0,-4,-20,0,0,0,0,-20],
// 3 16 -4 0 -4 0 0 -20 4 0 -4
  [3,16,-4,0,-4,0,0,-20,4,0,-4],
// 3 16 4 0 -4 0 0 -20 20 0 0
  [3,16,4,0,-4,0,0,-20,20,0,0],
// 3 16 4 0 -4 20 0 0 4 0 0
  [3,16,4,0,-4,20,0,0,4,0,0],
// 4 16 4 4 0 4 0 0 20 0 0 17.75 4 0
  [4,16,4,4,0,4,0,0,20,0,0,17.75,4,0],
// 4 16 -4 0 0 -4 4 0 -17.75 4 0 -20 0 0
  [4,16,-4,0,0,-4,4,0,-17.75,4,0,-20,0,0],
// 2 24 -4 0 0 -20 0 0
  [2,24,-4,0,0,-20,0,0],
// 2 24 -4 0 0 -4 4 0
  [2,24,-4,0,0,-4,4,0],
// 2 24 -4 4 0 -17.75 4 0
  [2,24,-4,4,0,-17.75,4,0],
// 2 24 4 0 0 4 4 0
  [2,24,4,0,0,4,4,0],
// 2 24 4 4 0 17.75 4 0
  [2,24,4,4,0,17.75,4,0],
// 2 24 20 0 0 4 0 0
  [2,24,20,0,0,4,0,0],
// 2 24 14.142 0 -14.142 11.9397 0 -15.6145
  [2,24,14.142,0,-14.142,11.9397,0,-15.6145],
// 2 24 14.142 0 -14.142 15.6145 0 -11.9387
  [2,24,14.142,0,-14.142,15.6145,0,-11.9387],
// 2 24 -11.9387 0 -15.6145 -14.142 0 -14.142
  [2,24,-11.9387,0,-15.6145,-14.142,0,-14.142],
// 2 24 -14.142 0 -14.142 -15.6145 0 -11.9397
  [2,24,-14.142,0,-14.142,-15.6145,0,-11.9397],
];
module ldraw_lib__38317(step=0, col=false, unit=2/5, alt=false, line=0.2, solid=!$preview)
    makepoly(ldraw_lib__38317(solid), step=step, col=col, unit=unit, alt=alt, line=line, solid=solid);
ldraw_lib__38317(line=0.2);
